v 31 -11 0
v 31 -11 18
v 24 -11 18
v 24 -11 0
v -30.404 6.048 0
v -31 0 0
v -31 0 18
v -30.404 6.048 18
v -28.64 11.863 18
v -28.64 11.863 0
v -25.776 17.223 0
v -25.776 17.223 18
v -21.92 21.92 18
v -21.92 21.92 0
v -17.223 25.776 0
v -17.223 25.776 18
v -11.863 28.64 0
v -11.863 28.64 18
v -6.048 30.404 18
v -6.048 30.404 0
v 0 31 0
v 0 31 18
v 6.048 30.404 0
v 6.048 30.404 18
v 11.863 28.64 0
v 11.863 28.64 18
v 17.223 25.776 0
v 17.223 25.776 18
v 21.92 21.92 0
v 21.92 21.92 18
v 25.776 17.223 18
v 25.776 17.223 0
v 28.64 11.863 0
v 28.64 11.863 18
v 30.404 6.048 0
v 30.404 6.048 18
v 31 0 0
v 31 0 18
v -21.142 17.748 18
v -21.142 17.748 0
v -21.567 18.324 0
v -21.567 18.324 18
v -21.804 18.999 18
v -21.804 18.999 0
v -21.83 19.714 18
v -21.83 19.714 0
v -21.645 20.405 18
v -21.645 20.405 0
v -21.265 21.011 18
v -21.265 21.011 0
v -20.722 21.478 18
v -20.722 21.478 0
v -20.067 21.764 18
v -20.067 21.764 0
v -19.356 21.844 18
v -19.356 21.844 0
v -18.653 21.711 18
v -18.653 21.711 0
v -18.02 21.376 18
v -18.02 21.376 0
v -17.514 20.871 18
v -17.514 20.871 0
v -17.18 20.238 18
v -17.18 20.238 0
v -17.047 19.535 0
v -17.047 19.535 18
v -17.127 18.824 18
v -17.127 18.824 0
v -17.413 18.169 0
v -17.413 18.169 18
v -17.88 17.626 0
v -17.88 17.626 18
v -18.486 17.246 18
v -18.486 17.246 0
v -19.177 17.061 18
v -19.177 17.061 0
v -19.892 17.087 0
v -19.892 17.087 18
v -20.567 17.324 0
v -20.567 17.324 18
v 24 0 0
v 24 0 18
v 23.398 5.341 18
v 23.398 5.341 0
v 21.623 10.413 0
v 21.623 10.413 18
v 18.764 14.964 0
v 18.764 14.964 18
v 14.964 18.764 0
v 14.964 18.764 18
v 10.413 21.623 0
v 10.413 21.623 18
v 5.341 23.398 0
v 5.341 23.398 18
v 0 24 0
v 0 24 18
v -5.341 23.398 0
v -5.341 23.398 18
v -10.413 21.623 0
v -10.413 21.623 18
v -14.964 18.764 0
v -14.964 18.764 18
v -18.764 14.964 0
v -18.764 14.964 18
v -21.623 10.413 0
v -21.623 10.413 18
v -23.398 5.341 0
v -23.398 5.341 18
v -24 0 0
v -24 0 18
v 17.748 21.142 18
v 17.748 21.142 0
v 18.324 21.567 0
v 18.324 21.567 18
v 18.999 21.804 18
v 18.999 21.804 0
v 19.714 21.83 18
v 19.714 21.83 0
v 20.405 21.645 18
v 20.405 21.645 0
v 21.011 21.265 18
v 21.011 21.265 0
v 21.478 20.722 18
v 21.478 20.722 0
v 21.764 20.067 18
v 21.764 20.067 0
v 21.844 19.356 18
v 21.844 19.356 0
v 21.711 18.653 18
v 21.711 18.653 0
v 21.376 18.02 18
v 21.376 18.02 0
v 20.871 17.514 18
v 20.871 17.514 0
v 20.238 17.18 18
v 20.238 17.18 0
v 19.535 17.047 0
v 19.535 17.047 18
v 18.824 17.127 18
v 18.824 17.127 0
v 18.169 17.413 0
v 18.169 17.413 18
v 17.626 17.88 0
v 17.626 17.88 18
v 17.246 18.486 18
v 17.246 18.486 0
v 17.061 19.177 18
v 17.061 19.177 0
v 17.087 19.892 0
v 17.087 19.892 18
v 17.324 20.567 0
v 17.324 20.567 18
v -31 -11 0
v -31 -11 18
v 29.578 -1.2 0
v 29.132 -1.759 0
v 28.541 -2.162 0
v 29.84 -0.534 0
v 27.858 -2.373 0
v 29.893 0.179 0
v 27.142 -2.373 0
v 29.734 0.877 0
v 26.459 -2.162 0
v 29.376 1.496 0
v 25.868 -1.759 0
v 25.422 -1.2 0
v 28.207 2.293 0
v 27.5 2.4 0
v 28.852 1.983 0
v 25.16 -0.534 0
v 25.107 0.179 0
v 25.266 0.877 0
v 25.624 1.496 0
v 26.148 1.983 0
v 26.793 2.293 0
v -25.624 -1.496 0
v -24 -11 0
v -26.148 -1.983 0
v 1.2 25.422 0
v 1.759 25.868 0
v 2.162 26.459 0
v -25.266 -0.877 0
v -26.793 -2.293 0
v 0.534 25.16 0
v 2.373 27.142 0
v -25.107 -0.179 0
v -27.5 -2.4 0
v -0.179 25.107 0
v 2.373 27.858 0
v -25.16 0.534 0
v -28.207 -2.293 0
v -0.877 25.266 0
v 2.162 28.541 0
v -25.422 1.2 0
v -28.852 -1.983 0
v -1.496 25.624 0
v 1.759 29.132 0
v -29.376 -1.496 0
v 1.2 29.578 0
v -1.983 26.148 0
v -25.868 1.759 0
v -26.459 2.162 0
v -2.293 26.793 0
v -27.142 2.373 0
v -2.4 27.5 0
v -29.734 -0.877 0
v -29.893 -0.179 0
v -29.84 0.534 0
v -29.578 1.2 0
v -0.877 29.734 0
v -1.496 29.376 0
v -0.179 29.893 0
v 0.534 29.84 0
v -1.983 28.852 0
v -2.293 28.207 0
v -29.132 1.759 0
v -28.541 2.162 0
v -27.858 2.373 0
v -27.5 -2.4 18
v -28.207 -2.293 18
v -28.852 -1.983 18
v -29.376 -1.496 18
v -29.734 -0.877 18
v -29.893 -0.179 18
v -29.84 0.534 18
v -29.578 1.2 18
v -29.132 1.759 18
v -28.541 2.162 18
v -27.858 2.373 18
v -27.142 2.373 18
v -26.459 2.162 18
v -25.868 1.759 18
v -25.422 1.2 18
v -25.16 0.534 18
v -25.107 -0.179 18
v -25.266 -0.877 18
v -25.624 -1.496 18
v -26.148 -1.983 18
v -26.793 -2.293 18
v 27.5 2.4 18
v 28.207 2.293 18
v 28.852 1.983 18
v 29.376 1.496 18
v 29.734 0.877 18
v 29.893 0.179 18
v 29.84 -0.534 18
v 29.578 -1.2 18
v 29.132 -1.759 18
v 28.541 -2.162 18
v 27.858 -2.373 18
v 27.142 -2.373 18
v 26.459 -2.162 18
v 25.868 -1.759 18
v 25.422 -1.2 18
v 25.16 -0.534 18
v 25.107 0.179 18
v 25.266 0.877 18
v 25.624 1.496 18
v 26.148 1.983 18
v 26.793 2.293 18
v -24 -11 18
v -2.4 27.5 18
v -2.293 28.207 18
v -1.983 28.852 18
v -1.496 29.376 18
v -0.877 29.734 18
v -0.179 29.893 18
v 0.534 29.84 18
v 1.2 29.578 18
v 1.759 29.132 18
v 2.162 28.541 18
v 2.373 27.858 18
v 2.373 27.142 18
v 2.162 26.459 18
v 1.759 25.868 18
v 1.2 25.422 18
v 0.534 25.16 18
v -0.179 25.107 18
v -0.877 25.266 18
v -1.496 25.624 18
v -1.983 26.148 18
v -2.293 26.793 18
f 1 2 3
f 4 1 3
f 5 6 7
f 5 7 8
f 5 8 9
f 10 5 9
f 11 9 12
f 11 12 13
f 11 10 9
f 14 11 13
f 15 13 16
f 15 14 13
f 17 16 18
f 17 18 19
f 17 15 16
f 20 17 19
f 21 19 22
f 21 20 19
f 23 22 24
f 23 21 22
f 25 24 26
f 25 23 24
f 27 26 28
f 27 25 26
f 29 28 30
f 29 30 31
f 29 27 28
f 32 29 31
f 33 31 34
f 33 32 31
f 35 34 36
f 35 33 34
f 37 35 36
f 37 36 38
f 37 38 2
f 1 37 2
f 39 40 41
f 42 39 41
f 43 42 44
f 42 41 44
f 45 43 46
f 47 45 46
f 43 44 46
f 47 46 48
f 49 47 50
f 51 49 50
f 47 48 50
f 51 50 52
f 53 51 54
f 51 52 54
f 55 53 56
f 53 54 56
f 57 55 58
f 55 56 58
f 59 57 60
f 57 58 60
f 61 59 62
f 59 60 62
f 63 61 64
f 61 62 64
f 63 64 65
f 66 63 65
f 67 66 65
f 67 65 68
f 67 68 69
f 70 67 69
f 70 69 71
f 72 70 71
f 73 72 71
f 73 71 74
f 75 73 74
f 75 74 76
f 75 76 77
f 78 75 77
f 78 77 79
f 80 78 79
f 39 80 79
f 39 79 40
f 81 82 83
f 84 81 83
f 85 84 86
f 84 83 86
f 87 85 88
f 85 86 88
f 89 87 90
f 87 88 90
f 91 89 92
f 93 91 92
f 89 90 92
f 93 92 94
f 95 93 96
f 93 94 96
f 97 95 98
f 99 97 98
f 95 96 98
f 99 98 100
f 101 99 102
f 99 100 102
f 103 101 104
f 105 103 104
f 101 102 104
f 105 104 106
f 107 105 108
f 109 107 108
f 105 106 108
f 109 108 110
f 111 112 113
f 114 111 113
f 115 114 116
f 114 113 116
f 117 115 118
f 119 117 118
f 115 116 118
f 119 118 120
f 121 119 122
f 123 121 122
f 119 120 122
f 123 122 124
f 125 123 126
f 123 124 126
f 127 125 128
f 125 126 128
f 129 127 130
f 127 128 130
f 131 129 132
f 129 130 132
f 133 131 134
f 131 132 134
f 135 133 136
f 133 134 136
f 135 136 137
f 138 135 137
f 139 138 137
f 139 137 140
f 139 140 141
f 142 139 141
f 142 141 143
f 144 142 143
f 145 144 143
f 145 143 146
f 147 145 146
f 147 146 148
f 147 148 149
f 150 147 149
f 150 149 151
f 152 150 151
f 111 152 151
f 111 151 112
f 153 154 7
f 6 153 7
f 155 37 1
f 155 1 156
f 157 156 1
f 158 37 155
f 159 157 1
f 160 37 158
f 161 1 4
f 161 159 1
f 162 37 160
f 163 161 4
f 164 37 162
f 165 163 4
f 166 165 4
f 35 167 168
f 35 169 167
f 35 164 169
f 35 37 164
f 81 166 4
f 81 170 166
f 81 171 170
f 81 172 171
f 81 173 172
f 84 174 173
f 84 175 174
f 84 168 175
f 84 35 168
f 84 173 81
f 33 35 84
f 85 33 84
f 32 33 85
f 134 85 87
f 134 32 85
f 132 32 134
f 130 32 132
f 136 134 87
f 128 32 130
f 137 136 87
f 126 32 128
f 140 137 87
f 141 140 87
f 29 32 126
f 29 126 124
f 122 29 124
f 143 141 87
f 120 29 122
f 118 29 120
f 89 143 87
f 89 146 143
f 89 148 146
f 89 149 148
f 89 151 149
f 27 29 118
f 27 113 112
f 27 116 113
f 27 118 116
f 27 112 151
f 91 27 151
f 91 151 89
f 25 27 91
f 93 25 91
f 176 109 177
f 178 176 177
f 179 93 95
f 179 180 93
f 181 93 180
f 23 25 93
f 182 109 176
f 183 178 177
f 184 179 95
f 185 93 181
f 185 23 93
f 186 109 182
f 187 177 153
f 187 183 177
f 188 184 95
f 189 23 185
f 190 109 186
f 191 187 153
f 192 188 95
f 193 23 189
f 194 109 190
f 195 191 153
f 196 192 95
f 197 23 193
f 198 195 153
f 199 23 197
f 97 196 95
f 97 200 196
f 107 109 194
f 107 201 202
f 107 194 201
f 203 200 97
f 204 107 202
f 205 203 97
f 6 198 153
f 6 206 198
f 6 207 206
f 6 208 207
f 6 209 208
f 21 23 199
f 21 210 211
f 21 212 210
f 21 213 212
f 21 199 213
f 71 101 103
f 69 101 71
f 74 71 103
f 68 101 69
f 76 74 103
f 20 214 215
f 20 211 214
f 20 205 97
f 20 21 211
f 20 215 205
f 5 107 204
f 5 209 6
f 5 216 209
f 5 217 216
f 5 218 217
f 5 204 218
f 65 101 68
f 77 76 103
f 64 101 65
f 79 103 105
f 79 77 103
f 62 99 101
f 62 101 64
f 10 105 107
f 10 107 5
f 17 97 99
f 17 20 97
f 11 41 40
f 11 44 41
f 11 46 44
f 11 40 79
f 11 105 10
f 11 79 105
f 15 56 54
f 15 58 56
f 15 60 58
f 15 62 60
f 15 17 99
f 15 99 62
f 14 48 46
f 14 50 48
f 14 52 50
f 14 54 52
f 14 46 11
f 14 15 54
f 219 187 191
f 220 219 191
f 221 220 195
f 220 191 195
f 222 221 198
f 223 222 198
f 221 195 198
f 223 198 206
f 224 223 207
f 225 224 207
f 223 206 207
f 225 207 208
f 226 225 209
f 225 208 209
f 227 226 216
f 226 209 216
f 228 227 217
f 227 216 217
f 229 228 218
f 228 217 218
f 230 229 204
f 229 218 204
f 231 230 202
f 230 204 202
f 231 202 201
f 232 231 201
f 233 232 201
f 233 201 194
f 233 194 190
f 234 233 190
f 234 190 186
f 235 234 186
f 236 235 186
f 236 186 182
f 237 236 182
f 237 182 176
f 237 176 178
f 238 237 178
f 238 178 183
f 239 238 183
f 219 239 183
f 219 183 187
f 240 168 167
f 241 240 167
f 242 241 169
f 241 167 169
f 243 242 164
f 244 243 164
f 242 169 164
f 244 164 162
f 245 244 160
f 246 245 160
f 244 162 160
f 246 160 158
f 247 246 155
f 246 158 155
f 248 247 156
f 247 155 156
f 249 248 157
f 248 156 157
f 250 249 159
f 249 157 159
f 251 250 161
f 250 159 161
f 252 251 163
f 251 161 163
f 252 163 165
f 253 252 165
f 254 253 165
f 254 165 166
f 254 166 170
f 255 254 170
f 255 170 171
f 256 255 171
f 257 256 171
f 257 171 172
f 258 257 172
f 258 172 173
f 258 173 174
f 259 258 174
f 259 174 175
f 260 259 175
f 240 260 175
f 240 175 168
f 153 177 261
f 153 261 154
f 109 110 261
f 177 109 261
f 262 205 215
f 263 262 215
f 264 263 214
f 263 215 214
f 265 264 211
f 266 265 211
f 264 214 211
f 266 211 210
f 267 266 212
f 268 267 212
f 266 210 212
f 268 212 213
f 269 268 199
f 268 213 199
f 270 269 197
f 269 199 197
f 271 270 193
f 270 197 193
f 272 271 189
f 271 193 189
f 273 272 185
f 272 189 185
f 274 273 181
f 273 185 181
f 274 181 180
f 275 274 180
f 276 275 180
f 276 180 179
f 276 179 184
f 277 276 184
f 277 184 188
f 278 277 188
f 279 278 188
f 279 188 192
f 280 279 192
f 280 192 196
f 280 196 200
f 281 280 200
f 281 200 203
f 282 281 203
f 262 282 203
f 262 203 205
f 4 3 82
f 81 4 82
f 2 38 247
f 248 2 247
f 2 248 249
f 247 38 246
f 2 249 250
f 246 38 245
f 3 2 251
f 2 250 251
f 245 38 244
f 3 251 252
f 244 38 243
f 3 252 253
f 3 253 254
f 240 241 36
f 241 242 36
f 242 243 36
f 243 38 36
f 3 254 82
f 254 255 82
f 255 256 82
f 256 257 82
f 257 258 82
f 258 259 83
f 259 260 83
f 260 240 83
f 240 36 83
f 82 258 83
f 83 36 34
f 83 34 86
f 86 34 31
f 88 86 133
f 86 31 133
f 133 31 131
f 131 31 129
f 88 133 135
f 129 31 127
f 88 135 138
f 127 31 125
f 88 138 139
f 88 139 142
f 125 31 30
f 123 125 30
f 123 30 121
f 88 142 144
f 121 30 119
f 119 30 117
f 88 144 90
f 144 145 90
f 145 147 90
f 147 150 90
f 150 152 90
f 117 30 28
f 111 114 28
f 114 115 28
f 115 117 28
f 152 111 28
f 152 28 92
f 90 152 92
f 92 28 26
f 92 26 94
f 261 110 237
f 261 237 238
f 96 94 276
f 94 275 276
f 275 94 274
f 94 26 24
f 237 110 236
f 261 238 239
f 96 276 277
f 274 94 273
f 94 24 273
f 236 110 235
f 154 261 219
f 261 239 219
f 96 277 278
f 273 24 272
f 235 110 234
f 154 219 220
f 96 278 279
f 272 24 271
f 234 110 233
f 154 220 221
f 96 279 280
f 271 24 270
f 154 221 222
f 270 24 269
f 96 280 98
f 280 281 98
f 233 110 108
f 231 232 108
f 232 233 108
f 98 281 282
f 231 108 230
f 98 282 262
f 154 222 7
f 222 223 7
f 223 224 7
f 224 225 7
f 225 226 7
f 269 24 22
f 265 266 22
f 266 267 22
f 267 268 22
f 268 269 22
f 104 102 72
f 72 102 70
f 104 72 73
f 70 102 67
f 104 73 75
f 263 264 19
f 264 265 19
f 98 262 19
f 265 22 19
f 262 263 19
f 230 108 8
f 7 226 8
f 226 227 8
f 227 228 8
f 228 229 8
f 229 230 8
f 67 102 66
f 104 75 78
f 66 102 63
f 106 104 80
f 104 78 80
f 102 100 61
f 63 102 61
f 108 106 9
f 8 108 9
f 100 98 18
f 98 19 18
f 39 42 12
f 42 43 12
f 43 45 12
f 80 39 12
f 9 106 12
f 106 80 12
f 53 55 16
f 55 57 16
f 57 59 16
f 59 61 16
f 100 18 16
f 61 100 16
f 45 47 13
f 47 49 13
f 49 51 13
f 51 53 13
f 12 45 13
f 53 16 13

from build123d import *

# Parameters (mm, degrees)
EXTRUDE_1_DEPTH          = 18
CUT_EXTRUDE_1_DEPTH      = 19
HOLE_WIZARD_M4_2_D       = 4.8
PATTERN_CIRCULAR_1_COUNT = 8


with BuildPart() as part:
    # ｽｹｯﾁ1 → ﾎﾞｽ - 押し出し1 (new body)
    with BuildSketch(Plane.XY):
        with BuildLine():
            ThreePointArc((-31, 0), (0, 31), (31, 0))
            Line((31, 0), (31, -11))
            Line((31, -11), (-31, -11))
            Line((-31, -11), (-31, 0))
        make_face()
    extrude(amount=EXTRUDE_1_DEPTH)

    # ｽｹｯﾁ2 → ｶｯﾄ - 押し出し1 (cut, through all)
    with BuildSketch(Plane.XY.offset(18)):
        with BuildLine():
            Line((-24, 0), (-24, -11))
            Line((-24, -11), (24, -11))
            Line((24, -11), (24, 0))
            ThreePointArc((24, 0), (0, 24), (-24, 0))
        make_face()
    extrude(amount=-CUT_EXTRUDE_1_DEPTH, mode=Mode.SUBTRACT)

    # M4 すきま穴2 (through all)
    with Locations(Plane.XY.offset(18)):
        with Locations((0, 27.5)):
            hole_wizard_m4_2 = Hole(HOLE_WIZARD_M4_2_D / 2)

    # 円形ﾊﾟﾀｰﾝ1: M4 すきま穴2 ×8 about axis, 3 skipped
    pattern_circular_1_axis = Axis((0, 0, 0), (0, 0, -1))
    add([hole_wizard_m4_2.rotate(pattern_circular_1_axis, i * 360 / PATTERN_CIRCULAR_1_COUNT) for i in range(1, PATTERN_CIRCULAR_1_COUNT) if i not in (3, 4, 5)], mode=Mode.SUBTRACT)


solid = part.part
